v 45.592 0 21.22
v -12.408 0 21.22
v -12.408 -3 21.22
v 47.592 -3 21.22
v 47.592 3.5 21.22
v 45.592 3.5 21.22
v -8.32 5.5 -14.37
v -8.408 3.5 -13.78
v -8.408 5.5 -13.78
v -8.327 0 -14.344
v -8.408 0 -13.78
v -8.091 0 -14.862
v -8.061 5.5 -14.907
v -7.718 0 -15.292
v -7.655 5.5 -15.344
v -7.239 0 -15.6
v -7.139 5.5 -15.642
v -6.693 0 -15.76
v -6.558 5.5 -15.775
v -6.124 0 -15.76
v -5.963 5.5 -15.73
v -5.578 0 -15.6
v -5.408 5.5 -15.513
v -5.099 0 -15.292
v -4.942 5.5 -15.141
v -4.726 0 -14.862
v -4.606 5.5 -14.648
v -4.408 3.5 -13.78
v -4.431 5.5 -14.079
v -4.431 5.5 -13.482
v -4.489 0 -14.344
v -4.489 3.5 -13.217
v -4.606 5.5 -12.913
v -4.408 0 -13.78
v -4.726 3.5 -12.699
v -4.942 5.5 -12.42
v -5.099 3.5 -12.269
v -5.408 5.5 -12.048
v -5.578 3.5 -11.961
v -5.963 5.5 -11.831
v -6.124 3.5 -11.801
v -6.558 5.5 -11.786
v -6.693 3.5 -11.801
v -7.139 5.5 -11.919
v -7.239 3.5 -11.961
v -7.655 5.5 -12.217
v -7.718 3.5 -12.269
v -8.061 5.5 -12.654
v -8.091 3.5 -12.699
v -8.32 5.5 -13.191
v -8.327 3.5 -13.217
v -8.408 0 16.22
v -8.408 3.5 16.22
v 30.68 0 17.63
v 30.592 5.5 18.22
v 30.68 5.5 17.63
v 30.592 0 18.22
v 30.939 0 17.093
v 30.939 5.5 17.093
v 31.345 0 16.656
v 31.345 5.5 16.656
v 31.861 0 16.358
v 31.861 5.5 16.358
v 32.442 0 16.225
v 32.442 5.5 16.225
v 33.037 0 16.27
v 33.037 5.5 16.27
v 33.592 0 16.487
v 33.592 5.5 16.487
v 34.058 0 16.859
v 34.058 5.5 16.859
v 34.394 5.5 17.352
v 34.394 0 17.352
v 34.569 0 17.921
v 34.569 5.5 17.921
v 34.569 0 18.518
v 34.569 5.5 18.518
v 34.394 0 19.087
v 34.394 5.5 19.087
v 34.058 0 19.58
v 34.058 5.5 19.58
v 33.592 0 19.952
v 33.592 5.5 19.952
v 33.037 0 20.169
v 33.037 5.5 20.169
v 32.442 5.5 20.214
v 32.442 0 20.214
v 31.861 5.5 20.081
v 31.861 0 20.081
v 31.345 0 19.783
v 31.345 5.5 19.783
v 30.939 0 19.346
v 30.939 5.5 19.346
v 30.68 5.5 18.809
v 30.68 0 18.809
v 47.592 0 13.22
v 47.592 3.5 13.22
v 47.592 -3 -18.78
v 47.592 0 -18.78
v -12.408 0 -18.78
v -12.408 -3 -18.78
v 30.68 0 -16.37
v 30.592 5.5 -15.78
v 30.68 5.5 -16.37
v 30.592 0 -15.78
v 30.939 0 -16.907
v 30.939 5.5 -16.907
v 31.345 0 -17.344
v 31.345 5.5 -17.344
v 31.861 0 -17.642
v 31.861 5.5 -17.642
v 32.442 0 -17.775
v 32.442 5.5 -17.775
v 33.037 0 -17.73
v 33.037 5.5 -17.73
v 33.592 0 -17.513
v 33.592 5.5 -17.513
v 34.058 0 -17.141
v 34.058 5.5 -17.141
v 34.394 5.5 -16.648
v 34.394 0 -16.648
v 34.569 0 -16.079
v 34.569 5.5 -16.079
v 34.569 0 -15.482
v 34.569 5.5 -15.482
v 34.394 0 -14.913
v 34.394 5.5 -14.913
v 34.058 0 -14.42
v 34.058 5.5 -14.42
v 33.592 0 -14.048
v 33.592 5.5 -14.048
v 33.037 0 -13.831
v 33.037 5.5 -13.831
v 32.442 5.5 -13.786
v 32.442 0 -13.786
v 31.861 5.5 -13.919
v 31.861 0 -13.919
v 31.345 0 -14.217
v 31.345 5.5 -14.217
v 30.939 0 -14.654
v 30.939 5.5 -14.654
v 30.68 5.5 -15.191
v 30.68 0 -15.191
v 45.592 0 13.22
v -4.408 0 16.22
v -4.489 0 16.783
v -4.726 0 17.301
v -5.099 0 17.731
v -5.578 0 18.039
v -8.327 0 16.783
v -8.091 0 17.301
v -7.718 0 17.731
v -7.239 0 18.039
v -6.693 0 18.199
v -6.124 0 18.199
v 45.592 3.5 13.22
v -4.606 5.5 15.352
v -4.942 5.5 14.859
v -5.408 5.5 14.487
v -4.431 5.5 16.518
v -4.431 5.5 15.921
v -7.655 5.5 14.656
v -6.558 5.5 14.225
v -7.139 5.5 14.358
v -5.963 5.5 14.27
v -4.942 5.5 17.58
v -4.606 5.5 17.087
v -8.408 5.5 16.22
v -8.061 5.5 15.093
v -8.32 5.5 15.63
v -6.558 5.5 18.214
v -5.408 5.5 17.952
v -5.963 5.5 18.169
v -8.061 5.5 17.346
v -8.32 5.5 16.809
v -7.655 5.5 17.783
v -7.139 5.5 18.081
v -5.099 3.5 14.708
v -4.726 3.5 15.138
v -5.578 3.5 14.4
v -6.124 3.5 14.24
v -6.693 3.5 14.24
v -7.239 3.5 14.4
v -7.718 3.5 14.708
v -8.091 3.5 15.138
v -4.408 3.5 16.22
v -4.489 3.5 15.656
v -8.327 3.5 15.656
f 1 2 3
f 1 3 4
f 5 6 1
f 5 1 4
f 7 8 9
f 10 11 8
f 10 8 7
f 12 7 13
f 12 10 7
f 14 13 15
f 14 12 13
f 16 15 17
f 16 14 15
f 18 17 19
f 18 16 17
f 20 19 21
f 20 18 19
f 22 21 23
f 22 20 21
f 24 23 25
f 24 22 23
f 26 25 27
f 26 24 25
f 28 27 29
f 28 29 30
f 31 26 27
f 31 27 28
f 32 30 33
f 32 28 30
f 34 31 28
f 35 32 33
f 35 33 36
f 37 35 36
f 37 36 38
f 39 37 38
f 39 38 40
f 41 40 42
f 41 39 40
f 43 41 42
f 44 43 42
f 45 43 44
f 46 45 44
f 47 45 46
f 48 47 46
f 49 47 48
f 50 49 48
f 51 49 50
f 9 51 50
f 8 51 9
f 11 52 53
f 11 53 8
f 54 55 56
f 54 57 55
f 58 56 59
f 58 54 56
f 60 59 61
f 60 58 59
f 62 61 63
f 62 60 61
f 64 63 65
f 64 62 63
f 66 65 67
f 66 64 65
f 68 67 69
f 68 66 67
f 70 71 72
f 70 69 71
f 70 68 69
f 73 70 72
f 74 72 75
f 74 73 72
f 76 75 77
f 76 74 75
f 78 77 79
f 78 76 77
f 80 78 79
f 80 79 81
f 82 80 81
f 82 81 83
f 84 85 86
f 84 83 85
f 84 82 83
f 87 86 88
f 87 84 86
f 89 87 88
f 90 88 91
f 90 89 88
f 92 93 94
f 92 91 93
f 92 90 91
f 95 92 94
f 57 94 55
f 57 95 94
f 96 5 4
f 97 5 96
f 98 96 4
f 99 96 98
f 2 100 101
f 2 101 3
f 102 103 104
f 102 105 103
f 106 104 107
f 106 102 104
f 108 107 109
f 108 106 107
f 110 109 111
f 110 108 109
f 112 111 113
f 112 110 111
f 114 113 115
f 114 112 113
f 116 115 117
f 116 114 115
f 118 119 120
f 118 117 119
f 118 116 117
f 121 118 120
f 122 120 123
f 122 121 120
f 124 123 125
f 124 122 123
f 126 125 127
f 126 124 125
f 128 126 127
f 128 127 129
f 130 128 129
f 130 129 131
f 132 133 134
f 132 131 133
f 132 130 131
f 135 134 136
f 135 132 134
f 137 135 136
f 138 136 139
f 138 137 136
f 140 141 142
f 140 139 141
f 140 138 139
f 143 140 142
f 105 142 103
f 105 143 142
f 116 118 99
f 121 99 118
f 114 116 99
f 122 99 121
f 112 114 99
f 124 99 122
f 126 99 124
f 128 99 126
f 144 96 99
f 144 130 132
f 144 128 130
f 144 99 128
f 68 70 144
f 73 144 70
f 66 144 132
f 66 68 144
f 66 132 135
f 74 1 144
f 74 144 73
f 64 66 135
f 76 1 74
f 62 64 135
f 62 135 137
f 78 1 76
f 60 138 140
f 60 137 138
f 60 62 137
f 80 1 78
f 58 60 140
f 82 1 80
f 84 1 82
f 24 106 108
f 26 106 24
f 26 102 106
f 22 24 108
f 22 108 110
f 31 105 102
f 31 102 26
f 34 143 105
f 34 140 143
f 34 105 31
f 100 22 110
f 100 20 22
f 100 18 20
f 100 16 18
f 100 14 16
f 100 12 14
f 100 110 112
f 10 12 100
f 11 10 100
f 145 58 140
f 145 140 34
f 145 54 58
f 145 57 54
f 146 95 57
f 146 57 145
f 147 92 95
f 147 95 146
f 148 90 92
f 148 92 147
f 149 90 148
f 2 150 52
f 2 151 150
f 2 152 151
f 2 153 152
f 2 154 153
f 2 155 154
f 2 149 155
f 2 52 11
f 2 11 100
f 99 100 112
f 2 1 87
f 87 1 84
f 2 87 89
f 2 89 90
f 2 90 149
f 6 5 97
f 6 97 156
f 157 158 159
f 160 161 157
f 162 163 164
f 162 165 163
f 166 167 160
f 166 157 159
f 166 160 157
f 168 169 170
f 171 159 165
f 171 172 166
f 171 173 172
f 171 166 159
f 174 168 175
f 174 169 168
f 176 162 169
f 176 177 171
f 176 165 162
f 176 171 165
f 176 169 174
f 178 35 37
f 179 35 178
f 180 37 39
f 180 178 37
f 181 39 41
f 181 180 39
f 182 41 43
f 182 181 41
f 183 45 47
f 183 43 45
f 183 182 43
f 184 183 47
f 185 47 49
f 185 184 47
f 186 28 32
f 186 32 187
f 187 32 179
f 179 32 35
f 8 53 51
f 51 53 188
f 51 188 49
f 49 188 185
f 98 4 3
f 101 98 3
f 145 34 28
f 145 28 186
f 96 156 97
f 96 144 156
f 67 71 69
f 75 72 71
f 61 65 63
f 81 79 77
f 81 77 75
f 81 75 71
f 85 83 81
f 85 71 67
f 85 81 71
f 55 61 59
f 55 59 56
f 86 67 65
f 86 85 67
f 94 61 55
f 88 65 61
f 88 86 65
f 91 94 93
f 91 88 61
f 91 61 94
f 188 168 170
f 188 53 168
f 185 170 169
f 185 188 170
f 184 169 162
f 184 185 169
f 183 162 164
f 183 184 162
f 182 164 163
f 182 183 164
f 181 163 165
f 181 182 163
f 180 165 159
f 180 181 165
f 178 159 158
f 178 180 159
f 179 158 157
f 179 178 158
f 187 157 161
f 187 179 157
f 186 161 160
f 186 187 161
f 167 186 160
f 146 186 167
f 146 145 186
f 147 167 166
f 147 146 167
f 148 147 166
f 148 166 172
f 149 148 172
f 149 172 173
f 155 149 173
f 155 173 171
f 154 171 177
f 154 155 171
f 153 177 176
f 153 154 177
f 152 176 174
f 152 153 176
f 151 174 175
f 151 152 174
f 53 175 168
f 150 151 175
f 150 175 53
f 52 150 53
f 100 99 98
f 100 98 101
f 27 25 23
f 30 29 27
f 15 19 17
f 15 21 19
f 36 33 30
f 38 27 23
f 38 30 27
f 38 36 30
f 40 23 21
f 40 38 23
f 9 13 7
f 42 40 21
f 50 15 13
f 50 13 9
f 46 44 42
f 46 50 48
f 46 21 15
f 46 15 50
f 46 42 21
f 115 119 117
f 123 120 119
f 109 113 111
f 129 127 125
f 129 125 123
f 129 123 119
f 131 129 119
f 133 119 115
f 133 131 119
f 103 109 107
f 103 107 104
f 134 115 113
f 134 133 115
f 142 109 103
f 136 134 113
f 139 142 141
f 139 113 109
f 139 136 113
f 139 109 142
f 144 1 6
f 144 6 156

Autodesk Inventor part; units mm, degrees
ref_plane "YZ Plane" through (0, 0, 0) normal (1, 0, 0) x (0, 1, 0)
ref_plane "XZ Plane" through (0, 0, 0) normal (0, 1, 0) x (-1, 0, 0)
ref_plane "XY Plane" through (0, 0, 0) normal (0, 0, 1) x (1, 0, 0)
sketch "Sketch1" plane through (0, 0, 0) normal (0, 1, 0) x (-1, 0, 0)
  line L0 (12.4084, 21.2195) -> (-47.5916, 21.2195)
  line L1 (-47.5916, 21.2195) -> (-47.5916, -18.7805)
  line L2 (-47.5916, -18.7805) -> (12.4084, -18.7805)
  line L3 (12.4084, -18.7805) -> (12.4084, 21.2195)
  circle A0 centre (6.4084, 16.2195) radius 2
  circle A1 centre (6.4084, -13.7805) radius 2
  circle A2 centre (-32.5916, 18.2195) radius 2
  circle A3 centre (-32.5916, -15.7805) radius 2
  line L4 (-47.5916, 21.2195) -> (-47.5916, 0)
  line L5 (-47.5916, 21.2195) -> (-45.5916, 21.2195)
  line L6 (-45.5916, 21.2195) -> (-45.5916, 13.2195)
  line L7 (-45.5916, 13.2195) -> (-47.5916, 13.2195)
  line L8 (-47.5916, 13.2195) -> (-47.5916, 21.2195)
  line L9 (8.4084, -15.7805) -> (4.4084, -15.7805)
  line L10 (4.4084, -15.7805) -> (4.4084, 18.2195)
  line L11 (4.4084, 18.2195) -> (8.4084, 18.2195)
  line L12 (8.4084, 18.2195) -> (8.4084, -15.7805)
  point P0 (0, 0)
  point P1 (8.4084, -13.7805)
  point P2 (8.4084, 16.2195)
  point P3 (4.4084, 16.2195)
  point P4 (4.4084, -13.7805)
  dimension "d0" = 40
  dimension "d1" = 60
  dimension "d2" = 4
  dimension "d3" = 4
  dimension "d4" = 4
  dimension "d5" = 4
  dimension "d6" = 5
  dimension "d7" = 5
  dimension "d9" = 6
  dimension "d10" = 6
  dimension "d11" = 3
  dimension "d12" = 3
  dimension "d13" = 15
  dimension "d14" = 15
  dimension "d15" = 34
  dimension "d16" = 39
  dimension "d17" = 30
  dimension "d26" = 8
  dimension "d27" = 2
extrude "Extrusion1" add sketch "Sketch1" against normal blind 3 contours L3 L2 L1 L7 L6 L0 | L6 L7 L1 L0 | A0 | L12 A1 L10 A0 | A0 L11 L12 | A0 L10 L11 | A1 | L12 L9 A1 | A1 L9 L10 | A2 | A3
extrude "Extrusion2" add sketch "Sketch1" along normal blind 5.5 contours A0 | A1 | A2 | A3
extrude "Extrusion3" add sketch "Sketch1" along normal blind 3.5 contours L6 L7 L1 L0 | L12 A1 L10 A0
properties part number "RFID Reader Frontboard"
